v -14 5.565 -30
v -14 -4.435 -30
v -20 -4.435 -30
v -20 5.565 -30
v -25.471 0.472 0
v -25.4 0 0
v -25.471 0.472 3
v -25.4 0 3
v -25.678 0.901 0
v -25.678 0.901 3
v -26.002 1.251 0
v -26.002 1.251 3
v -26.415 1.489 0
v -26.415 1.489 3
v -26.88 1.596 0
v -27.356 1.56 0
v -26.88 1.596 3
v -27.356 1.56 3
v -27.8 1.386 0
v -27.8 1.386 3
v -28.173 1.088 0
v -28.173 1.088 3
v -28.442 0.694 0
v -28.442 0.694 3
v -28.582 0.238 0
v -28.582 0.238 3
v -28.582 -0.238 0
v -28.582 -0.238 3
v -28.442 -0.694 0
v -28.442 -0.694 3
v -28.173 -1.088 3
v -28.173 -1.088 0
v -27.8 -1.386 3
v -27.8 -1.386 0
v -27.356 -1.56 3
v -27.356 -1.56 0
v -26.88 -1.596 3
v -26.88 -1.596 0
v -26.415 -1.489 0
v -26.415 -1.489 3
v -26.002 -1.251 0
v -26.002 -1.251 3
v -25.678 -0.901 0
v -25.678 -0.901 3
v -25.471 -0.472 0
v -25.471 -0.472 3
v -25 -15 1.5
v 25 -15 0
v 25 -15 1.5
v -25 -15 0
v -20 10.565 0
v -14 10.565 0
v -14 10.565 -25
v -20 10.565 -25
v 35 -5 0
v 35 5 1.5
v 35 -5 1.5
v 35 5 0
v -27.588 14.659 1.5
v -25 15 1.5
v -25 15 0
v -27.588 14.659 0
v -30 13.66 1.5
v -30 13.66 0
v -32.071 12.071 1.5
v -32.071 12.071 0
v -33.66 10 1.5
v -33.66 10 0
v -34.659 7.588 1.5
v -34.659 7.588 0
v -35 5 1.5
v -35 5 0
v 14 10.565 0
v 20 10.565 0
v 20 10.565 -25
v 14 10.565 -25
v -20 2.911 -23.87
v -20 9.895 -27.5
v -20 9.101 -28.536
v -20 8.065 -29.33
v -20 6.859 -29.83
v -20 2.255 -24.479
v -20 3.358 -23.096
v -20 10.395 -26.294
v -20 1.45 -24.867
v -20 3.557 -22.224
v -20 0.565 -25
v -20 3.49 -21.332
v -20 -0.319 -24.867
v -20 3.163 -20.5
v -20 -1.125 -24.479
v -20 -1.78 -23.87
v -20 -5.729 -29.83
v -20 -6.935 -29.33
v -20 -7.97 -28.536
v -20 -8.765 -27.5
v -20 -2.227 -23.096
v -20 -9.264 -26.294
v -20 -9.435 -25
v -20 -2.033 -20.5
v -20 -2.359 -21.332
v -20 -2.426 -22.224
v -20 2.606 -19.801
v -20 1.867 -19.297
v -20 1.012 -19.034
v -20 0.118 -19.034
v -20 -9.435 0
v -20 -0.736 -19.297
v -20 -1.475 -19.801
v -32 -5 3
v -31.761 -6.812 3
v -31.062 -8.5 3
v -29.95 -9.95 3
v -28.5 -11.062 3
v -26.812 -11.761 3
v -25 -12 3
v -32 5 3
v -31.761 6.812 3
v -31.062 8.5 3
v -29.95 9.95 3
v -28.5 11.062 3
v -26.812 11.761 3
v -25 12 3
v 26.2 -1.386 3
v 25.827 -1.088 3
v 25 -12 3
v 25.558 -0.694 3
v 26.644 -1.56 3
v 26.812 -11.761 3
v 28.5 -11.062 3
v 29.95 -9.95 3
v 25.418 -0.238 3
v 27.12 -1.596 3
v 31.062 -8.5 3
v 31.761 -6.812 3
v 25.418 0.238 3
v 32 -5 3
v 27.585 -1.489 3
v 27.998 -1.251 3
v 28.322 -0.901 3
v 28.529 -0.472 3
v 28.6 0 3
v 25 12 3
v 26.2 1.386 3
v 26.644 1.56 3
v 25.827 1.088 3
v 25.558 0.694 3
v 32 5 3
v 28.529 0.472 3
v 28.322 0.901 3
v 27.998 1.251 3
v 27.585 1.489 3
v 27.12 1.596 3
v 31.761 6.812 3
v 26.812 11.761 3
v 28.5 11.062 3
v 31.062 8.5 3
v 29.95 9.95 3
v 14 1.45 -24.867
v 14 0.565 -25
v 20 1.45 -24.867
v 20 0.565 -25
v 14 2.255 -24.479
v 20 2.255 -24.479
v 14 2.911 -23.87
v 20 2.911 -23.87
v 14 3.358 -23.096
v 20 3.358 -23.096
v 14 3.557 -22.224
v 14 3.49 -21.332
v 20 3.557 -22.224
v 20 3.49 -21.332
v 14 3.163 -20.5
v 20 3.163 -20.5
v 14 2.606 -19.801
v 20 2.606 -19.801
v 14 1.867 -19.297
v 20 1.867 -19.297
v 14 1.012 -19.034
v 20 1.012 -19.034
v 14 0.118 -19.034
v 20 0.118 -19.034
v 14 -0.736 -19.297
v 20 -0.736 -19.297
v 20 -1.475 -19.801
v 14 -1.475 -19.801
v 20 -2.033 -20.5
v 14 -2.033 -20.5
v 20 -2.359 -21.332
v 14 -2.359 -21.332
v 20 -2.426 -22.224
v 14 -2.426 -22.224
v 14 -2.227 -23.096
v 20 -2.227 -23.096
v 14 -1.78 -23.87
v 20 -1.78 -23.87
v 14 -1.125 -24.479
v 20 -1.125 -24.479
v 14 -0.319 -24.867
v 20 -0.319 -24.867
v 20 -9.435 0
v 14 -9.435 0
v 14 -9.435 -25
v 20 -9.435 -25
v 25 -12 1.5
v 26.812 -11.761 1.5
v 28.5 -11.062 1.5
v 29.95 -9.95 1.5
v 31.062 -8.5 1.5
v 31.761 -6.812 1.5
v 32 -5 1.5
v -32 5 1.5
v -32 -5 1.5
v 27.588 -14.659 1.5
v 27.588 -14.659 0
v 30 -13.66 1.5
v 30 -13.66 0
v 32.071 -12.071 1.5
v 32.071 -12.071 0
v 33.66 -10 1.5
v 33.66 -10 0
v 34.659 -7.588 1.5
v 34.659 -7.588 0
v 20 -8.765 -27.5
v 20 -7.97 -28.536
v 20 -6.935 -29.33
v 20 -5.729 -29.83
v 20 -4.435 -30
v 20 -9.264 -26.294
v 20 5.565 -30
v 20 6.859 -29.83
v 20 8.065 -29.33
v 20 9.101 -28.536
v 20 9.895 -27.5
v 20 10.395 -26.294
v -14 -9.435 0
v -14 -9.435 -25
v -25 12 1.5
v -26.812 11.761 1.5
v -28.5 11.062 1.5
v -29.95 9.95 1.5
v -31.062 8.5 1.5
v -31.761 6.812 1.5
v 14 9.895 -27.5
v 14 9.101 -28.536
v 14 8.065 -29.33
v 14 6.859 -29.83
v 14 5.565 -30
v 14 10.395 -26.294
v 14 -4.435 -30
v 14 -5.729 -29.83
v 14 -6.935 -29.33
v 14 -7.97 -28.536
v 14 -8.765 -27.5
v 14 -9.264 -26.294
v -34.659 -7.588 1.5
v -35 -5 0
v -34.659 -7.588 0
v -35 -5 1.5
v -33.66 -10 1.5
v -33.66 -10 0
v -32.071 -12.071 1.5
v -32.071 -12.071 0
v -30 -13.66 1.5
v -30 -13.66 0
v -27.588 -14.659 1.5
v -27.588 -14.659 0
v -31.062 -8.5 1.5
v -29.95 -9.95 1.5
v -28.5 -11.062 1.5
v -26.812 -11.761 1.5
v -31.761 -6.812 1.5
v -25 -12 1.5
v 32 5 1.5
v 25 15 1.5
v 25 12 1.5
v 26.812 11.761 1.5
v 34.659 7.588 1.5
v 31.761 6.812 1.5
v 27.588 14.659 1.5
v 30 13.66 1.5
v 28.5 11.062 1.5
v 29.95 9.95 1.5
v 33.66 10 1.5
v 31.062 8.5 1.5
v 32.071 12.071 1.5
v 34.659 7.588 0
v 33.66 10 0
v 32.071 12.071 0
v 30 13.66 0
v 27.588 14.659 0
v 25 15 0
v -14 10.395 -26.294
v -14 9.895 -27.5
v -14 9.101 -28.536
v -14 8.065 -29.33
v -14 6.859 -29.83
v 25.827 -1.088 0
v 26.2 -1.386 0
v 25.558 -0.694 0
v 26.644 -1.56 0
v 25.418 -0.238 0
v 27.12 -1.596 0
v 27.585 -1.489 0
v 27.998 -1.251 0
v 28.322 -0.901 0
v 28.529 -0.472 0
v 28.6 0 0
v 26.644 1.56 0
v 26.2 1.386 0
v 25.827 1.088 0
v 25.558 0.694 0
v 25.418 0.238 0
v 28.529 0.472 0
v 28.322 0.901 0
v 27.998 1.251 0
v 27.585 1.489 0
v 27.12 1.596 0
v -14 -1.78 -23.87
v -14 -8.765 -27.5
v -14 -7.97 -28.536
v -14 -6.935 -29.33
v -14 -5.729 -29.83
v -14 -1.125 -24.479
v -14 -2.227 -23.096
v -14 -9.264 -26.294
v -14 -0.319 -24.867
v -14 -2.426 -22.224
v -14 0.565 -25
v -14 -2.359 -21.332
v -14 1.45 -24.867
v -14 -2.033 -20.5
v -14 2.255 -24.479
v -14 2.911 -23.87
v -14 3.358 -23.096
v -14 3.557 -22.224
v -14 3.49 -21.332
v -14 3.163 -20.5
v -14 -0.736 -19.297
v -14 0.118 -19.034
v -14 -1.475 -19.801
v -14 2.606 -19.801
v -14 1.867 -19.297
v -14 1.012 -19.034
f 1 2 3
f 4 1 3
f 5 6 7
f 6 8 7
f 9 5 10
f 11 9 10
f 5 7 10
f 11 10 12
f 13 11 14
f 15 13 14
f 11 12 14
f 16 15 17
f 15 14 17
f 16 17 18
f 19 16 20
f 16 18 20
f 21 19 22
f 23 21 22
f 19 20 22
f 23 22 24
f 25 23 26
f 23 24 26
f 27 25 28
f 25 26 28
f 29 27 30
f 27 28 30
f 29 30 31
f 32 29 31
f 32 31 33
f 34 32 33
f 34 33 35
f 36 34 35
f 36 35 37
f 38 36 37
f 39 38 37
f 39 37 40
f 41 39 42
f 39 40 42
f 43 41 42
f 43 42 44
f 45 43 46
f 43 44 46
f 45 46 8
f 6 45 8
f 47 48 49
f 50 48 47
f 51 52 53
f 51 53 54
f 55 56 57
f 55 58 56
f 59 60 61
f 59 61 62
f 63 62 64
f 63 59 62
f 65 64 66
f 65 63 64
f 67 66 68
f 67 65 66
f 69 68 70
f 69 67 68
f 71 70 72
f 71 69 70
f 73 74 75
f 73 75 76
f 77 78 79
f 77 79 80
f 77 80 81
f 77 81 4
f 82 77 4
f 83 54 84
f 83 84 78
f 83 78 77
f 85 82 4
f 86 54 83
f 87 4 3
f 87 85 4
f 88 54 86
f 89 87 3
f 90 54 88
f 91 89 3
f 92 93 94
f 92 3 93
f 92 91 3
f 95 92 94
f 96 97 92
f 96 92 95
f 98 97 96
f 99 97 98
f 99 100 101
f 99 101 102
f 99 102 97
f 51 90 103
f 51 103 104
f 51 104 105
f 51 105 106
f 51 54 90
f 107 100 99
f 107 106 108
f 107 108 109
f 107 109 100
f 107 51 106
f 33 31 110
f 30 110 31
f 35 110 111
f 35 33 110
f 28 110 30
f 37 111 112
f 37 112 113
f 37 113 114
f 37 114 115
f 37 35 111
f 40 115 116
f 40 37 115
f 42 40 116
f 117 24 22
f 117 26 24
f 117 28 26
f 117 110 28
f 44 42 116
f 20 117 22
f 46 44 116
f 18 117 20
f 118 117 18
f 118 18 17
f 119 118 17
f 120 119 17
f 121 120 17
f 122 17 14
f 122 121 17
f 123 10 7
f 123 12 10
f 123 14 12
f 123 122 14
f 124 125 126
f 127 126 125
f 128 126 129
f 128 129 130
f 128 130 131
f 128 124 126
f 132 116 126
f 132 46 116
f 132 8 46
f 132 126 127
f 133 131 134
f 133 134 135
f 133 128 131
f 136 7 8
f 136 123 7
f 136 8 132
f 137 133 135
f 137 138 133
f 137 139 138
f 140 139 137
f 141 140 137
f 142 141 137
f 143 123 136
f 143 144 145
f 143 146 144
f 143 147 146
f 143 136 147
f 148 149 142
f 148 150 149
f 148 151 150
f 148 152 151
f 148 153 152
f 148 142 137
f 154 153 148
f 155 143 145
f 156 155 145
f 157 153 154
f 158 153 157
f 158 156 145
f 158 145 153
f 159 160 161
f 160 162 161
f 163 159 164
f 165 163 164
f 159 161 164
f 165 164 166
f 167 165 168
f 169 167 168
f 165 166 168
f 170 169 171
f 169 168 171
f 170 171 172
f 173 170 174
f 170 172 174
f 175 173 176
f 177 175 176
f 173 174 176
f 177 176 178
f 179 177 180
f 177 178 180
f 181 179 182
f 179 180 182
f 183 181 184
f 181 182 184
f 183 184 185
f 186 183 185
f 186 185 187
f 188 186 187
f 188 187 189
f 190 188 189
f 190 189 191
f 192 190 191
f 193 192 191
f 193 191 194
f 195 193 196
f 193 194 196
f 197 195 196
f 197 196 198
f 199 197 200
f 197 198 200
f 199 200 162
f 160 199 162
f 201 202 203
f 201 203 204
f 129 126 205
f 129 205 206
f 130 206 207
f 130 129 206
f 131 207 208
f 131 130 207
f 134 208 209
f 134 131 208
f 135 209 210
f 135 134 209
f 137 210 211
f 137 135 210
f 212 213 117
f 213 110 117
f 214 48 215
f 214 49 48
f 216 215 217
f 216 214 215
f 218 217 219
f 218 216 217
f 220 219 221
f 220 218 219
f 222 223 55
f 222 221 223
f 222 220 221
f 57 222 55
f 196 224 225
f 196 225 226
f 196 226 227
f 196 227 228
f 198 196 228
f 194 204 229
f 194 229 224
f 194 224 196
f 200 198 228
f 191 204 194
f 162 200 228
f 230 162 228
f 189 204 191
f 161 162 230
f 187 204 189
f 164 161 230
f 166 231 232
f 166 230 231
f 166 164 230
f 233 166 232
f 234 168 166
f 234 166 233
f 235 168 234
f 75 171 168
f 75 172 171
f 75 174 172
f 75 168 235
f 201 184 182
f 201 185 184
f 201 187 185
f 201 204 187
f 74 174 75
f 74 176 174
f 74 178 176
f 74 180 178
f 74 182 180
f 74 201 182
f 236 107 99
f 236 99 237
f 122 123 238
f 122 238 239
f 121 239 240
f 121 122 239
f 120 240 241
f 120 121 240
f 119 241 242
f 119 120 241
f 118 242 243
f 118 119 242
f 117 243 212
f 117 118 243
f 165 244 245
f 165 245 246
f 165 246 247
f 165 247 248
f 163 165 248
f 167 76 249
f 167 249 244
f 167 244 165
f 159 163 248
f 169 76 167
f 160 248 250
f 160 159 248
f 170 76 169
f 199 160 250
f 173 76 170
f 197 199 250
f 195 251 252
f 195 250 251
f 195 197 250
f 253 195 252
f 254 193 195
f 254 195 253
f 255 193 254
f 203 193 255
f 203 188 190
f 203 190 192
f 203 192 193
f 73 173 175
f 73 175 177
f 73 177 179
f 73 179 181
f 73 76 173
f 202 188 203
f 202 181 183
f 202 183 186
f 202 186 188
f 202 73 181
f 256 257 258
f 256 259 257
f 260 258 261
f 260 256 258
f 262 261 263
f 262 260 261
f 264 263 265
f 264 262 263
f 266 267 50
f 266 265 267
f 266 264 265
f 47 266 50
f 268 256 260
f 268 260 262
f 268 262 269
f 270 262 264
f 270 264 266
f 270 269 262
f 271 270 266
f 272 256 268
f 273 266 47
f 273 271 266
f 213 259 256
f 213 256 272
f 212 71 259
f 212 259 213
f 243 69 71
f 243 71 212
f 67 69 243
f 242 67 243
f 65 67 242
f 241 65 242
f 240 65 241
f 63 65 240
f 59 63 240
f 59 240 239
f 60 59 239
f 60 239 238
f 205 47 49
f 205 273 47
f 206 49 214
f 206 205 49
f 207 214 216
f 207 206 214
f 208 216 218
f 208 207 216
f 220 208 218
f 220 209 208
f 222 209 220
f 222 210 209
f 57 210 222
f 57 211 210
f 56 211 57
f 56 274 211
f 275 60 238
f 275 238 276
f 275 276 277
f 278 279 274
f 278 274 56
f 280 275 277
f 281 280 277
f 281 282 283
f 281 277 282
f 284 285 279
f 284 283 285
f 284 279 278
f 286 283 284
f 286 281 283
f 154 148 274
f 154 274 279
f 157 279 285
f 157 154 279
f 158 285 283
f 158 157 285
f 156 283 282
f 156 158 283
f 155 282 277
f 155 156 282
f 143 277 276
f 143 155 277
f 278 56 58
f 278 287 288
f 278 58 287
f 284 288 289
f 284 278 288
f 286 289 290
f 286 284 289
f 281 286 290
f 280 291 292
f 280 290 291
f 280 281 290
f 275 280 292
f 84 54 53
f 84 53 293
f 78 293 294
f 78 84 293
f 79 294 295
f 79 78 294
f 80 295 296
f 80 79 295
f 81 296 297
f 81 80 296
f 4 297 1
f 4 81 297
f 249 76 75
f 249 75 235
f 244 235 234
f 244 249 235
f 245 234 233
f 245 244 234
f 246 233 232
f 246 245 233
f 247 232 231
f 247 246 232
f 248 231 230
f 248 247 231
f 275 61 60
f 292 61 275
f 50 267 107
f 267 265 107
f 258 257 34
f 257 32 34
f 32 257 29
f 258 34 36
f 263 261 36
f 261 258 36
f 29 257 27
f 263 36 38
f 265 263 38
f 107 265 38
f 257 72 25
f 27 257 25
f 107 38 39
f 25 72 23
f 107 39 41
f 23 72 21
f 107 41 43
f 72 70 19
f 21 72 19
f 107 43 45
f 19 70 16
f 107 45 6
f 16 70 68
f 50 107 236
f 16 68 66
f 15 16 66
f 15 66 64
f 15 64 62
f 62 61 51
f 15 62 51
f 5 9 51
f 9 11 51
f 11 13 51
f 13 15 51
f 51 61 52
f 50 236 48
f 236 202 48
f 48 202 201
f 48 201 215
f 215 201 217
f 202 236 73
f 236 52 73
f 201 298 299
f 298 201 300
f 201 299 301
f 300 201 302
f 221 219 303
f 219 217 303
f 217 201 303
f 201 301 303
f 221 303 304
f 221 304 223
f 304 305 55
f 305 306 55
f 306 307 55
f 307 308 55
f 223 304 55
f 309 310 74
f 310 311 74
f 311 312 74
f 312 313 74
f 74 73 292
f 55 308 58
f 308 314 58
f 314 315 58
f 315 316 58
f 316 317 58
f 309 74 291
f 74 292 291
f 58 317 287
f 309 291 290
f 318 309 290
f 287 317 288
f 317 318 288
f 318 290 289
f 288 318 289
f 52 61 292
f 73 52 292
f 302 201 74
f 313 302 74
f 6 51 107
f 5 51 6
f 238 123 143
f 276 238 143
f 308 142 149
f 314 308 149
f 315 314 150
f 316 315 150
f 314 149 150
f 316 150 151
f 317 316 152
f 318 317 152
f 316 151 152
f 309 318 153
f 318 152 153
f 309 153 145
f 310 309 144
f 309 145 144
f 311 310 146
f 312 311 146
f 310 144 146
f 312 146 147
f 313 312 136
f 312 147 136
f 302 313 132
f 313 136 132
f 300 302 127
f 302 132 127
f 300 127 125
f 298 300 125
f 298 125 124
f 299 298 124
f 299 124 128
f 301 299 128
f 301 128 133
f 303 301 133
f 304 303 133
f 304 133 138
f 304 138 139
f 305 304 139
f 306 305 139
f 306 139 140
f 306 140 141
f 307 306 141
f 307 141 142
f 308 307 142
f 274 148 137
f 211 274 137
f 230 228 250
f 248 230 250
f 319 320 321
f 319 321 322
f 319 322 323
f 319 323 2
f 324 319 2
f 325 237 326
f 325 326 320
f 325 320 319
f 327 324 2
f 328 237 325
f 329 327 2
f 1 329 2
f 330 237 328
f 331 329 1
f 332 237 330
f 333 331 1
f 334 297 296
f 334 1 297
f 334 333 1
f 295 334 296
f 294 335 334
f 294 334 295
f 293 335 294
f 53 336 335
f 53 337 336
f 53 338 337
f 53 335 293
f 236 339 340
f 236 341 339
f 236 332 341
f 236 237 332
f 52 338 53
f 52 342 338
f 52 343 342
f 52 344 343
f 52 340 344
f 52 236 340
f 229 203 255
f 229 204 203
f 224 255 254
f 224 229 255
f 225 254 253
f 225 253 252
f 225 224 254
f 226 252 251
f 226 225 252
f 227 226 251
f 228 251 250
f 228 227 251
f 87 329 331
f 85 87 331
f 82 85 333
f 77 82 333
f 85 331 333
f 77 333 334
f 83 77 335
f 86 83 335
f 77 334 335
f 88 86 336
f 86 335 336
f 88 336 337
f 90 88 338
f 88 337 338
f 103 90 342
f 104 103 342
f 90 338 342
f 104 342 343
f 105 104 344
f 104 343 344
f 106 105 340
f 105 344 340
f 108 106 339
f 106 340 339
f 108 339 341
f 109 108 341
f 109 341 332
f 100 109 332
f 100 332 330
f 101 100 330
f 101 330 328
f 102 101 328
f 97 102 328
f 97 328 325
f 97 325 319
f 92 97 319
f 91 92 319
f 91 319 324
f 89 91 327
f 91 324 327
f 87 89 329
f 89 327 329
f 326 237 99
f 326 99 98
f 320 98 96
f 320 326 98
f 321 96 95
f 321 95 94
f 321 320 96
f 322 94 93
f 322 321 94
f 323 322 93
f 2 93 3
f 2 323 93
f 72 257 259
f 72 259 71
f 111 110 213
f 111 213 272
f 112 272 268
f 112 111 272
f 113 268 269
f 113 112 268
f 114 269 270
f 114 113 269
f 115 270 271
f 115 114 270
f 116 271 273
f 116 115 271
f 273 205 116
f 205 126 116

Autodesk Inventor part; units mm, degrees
ref_plane "YZ Plane" through (0, 0, 0) normal (1, 0, 0) x (0, 1, 0)
ref_plane "XZ Plane" through (0, 0, 0) normal (0, 1, 0) x (-1, 0, 0)
ref_plane "XY Plane" through (0, 0, 0) normal (0, 0, 1) x (1, 0, 0)
sketch "Sketch1" plane through (0, 0, 0) normal (0, 0, 1) x (1, 0, 0)
  line L0 (-35, 15) -> (35, 15)
  line L1 (35, 15) -> (35, -15)
  line L2 (35, -15) -> (-35, -15)
  line L3 (-35, -15) -> (-35, 15)
  point P0 (0, 0)
  dimension "d0" = 70
  dimension "d1" = 30
  dimension "d7" = 35
  dimension "d8" = 15
extrude "Extrusion1" add sketch "Sketch1" along normal blind 3
fillet "Fillet1" radius 10 4 edges at (-35, 15, 1.5) (-35, -15, 1.5) (35, -15, 1.5) (35, 15, 1.5)
sketch "Sketch6" plane through (0, 0, 3) normal (0, 0, 1) x (1, 0, 0)
  arc A0 (35, 5) -> (25, 15) centre (25, 5) ccw projected
  line L0 (25, 15) -> (-25, 15) projected
  arc A1 (-25, 15) -> (-35, 5) centre (-25, 5) ccw projected
  line L1 (-35, 5) -> (-35, -5) projected
  arc A2 (-35, -5) -> (-25, -15) centre (-25, -5) ccw projected
  line L2 (-25, -15) -> (25, -15) projected
  arc A3 (25, -15) -> (35, -5) centre (25, -5) ccw projected
  line L3 (35, -5) -> (35, 5) projected
  arc A4 (-25, 12) -> (-32, 5) centre (-25, 5) ccw
  line L4 (-25, 12) -> (25, 12)
  arc A5 (32, 5) -> (25, 12) centre (25, 5) ccw
  line L5 (32, 5) -> (32, -5)
  arc A6 (25, -12) -> (32, -5) centre (25, -5) ccw
  line L6 (25, -12) -> (-25, -12)
  arc A7 (-32, -5) -> (-25, -12) centre (-25, -5) ccw
  line L7 (-32, -5) -> (-32, 5)
  point P0 (0, 0)
  dimension "d43" = 3
extrude "Extrusion5" cut sketch "Sketch6" against normal blind 1.5
sketch "Sketch7" plane through (0, 0, 3) normal (0, 0, 1) x (1, 0, 0)
  line L0 (-35, -5) -> (-35, 5) projected
  line L1 (35, 5) -> (35, -5) projected
  circle A0 centre (-27, 0) radius 1.6
  circle A1 centre (27, 0) radius 1.6
  point P0 (0, 0)
  point P1 (-35, 0)
  dimension "d46" = 3.2
  dimension "d47" = 8
  dimension "d48" = 3.2
  dimension "d49" = 8
extrude "Extrusion6" cut sketch "Sketch7" against normal through all
sketch "Sketch8" plane through (0, 0, 0) normal (0, 0, -1) x (-1, 0, 0)
  line L0 (-20, 10.5653) -> (-14, 10.5653)
  line L1 (-14, 10.5653) -> (-14, -9.4347)
  line L2 (-14, -9.4347) -> (-20, -9.4347)
  line L3 (-20, -9.4347) -> (-20, 10.5653)
  line L4 (14, 10.5653) -> (20, 10.5653)
  line L5 (20, 10.5653) -> (20, -9.4347)
  line L6 (20, -9.4347) -> (14, -9.4347)
  line L7 (14, -9.4347) -> (14, 10.5653)
  line L8 (-35, -5) -> (-35, 5) projected
  line L9 (35, 5) -> (35, -5) projected
  point P0 (0, 0)
  point P1 (-35, 0)
  dimension "d52" = 20
  dimension "d53" = 6
  dimension "d54" = 6
  dimension "d55" = 15
  dimension "d56" = 15
extrude "Extrusion7" add sketch "Sketch8" along normal blind 30
sketch "Sketch9" plane through (20, -9.4347, 0) normal (1, 0, 0) x (0, 0, -1)
  circle A0 centre (22, 10) radius 3
  line L0 (0, 0) -> (30, 0) projected
  line L1 (30, 20) -> (30, 0) projected
  point P0 (0, 9.4347)
  dimension "d59" = 6
  dimension "d60" = 10
  dimension "d61" = 8
extrude "Extrusion8" cut sketch "Sketch9" against normal through all
fillet "Fillet2" radius 5 4 edges at (17, -9.4347, -30) (17, 10.5653, -30) (-17, 10.5653, -30) (-17, -9.4347, -30)
equation "\"d7\" = 0.5 * d0"
equation "\"d8\" = 0.5 * d1"
properties part number "sensor_cover_ultrasonic_2"
